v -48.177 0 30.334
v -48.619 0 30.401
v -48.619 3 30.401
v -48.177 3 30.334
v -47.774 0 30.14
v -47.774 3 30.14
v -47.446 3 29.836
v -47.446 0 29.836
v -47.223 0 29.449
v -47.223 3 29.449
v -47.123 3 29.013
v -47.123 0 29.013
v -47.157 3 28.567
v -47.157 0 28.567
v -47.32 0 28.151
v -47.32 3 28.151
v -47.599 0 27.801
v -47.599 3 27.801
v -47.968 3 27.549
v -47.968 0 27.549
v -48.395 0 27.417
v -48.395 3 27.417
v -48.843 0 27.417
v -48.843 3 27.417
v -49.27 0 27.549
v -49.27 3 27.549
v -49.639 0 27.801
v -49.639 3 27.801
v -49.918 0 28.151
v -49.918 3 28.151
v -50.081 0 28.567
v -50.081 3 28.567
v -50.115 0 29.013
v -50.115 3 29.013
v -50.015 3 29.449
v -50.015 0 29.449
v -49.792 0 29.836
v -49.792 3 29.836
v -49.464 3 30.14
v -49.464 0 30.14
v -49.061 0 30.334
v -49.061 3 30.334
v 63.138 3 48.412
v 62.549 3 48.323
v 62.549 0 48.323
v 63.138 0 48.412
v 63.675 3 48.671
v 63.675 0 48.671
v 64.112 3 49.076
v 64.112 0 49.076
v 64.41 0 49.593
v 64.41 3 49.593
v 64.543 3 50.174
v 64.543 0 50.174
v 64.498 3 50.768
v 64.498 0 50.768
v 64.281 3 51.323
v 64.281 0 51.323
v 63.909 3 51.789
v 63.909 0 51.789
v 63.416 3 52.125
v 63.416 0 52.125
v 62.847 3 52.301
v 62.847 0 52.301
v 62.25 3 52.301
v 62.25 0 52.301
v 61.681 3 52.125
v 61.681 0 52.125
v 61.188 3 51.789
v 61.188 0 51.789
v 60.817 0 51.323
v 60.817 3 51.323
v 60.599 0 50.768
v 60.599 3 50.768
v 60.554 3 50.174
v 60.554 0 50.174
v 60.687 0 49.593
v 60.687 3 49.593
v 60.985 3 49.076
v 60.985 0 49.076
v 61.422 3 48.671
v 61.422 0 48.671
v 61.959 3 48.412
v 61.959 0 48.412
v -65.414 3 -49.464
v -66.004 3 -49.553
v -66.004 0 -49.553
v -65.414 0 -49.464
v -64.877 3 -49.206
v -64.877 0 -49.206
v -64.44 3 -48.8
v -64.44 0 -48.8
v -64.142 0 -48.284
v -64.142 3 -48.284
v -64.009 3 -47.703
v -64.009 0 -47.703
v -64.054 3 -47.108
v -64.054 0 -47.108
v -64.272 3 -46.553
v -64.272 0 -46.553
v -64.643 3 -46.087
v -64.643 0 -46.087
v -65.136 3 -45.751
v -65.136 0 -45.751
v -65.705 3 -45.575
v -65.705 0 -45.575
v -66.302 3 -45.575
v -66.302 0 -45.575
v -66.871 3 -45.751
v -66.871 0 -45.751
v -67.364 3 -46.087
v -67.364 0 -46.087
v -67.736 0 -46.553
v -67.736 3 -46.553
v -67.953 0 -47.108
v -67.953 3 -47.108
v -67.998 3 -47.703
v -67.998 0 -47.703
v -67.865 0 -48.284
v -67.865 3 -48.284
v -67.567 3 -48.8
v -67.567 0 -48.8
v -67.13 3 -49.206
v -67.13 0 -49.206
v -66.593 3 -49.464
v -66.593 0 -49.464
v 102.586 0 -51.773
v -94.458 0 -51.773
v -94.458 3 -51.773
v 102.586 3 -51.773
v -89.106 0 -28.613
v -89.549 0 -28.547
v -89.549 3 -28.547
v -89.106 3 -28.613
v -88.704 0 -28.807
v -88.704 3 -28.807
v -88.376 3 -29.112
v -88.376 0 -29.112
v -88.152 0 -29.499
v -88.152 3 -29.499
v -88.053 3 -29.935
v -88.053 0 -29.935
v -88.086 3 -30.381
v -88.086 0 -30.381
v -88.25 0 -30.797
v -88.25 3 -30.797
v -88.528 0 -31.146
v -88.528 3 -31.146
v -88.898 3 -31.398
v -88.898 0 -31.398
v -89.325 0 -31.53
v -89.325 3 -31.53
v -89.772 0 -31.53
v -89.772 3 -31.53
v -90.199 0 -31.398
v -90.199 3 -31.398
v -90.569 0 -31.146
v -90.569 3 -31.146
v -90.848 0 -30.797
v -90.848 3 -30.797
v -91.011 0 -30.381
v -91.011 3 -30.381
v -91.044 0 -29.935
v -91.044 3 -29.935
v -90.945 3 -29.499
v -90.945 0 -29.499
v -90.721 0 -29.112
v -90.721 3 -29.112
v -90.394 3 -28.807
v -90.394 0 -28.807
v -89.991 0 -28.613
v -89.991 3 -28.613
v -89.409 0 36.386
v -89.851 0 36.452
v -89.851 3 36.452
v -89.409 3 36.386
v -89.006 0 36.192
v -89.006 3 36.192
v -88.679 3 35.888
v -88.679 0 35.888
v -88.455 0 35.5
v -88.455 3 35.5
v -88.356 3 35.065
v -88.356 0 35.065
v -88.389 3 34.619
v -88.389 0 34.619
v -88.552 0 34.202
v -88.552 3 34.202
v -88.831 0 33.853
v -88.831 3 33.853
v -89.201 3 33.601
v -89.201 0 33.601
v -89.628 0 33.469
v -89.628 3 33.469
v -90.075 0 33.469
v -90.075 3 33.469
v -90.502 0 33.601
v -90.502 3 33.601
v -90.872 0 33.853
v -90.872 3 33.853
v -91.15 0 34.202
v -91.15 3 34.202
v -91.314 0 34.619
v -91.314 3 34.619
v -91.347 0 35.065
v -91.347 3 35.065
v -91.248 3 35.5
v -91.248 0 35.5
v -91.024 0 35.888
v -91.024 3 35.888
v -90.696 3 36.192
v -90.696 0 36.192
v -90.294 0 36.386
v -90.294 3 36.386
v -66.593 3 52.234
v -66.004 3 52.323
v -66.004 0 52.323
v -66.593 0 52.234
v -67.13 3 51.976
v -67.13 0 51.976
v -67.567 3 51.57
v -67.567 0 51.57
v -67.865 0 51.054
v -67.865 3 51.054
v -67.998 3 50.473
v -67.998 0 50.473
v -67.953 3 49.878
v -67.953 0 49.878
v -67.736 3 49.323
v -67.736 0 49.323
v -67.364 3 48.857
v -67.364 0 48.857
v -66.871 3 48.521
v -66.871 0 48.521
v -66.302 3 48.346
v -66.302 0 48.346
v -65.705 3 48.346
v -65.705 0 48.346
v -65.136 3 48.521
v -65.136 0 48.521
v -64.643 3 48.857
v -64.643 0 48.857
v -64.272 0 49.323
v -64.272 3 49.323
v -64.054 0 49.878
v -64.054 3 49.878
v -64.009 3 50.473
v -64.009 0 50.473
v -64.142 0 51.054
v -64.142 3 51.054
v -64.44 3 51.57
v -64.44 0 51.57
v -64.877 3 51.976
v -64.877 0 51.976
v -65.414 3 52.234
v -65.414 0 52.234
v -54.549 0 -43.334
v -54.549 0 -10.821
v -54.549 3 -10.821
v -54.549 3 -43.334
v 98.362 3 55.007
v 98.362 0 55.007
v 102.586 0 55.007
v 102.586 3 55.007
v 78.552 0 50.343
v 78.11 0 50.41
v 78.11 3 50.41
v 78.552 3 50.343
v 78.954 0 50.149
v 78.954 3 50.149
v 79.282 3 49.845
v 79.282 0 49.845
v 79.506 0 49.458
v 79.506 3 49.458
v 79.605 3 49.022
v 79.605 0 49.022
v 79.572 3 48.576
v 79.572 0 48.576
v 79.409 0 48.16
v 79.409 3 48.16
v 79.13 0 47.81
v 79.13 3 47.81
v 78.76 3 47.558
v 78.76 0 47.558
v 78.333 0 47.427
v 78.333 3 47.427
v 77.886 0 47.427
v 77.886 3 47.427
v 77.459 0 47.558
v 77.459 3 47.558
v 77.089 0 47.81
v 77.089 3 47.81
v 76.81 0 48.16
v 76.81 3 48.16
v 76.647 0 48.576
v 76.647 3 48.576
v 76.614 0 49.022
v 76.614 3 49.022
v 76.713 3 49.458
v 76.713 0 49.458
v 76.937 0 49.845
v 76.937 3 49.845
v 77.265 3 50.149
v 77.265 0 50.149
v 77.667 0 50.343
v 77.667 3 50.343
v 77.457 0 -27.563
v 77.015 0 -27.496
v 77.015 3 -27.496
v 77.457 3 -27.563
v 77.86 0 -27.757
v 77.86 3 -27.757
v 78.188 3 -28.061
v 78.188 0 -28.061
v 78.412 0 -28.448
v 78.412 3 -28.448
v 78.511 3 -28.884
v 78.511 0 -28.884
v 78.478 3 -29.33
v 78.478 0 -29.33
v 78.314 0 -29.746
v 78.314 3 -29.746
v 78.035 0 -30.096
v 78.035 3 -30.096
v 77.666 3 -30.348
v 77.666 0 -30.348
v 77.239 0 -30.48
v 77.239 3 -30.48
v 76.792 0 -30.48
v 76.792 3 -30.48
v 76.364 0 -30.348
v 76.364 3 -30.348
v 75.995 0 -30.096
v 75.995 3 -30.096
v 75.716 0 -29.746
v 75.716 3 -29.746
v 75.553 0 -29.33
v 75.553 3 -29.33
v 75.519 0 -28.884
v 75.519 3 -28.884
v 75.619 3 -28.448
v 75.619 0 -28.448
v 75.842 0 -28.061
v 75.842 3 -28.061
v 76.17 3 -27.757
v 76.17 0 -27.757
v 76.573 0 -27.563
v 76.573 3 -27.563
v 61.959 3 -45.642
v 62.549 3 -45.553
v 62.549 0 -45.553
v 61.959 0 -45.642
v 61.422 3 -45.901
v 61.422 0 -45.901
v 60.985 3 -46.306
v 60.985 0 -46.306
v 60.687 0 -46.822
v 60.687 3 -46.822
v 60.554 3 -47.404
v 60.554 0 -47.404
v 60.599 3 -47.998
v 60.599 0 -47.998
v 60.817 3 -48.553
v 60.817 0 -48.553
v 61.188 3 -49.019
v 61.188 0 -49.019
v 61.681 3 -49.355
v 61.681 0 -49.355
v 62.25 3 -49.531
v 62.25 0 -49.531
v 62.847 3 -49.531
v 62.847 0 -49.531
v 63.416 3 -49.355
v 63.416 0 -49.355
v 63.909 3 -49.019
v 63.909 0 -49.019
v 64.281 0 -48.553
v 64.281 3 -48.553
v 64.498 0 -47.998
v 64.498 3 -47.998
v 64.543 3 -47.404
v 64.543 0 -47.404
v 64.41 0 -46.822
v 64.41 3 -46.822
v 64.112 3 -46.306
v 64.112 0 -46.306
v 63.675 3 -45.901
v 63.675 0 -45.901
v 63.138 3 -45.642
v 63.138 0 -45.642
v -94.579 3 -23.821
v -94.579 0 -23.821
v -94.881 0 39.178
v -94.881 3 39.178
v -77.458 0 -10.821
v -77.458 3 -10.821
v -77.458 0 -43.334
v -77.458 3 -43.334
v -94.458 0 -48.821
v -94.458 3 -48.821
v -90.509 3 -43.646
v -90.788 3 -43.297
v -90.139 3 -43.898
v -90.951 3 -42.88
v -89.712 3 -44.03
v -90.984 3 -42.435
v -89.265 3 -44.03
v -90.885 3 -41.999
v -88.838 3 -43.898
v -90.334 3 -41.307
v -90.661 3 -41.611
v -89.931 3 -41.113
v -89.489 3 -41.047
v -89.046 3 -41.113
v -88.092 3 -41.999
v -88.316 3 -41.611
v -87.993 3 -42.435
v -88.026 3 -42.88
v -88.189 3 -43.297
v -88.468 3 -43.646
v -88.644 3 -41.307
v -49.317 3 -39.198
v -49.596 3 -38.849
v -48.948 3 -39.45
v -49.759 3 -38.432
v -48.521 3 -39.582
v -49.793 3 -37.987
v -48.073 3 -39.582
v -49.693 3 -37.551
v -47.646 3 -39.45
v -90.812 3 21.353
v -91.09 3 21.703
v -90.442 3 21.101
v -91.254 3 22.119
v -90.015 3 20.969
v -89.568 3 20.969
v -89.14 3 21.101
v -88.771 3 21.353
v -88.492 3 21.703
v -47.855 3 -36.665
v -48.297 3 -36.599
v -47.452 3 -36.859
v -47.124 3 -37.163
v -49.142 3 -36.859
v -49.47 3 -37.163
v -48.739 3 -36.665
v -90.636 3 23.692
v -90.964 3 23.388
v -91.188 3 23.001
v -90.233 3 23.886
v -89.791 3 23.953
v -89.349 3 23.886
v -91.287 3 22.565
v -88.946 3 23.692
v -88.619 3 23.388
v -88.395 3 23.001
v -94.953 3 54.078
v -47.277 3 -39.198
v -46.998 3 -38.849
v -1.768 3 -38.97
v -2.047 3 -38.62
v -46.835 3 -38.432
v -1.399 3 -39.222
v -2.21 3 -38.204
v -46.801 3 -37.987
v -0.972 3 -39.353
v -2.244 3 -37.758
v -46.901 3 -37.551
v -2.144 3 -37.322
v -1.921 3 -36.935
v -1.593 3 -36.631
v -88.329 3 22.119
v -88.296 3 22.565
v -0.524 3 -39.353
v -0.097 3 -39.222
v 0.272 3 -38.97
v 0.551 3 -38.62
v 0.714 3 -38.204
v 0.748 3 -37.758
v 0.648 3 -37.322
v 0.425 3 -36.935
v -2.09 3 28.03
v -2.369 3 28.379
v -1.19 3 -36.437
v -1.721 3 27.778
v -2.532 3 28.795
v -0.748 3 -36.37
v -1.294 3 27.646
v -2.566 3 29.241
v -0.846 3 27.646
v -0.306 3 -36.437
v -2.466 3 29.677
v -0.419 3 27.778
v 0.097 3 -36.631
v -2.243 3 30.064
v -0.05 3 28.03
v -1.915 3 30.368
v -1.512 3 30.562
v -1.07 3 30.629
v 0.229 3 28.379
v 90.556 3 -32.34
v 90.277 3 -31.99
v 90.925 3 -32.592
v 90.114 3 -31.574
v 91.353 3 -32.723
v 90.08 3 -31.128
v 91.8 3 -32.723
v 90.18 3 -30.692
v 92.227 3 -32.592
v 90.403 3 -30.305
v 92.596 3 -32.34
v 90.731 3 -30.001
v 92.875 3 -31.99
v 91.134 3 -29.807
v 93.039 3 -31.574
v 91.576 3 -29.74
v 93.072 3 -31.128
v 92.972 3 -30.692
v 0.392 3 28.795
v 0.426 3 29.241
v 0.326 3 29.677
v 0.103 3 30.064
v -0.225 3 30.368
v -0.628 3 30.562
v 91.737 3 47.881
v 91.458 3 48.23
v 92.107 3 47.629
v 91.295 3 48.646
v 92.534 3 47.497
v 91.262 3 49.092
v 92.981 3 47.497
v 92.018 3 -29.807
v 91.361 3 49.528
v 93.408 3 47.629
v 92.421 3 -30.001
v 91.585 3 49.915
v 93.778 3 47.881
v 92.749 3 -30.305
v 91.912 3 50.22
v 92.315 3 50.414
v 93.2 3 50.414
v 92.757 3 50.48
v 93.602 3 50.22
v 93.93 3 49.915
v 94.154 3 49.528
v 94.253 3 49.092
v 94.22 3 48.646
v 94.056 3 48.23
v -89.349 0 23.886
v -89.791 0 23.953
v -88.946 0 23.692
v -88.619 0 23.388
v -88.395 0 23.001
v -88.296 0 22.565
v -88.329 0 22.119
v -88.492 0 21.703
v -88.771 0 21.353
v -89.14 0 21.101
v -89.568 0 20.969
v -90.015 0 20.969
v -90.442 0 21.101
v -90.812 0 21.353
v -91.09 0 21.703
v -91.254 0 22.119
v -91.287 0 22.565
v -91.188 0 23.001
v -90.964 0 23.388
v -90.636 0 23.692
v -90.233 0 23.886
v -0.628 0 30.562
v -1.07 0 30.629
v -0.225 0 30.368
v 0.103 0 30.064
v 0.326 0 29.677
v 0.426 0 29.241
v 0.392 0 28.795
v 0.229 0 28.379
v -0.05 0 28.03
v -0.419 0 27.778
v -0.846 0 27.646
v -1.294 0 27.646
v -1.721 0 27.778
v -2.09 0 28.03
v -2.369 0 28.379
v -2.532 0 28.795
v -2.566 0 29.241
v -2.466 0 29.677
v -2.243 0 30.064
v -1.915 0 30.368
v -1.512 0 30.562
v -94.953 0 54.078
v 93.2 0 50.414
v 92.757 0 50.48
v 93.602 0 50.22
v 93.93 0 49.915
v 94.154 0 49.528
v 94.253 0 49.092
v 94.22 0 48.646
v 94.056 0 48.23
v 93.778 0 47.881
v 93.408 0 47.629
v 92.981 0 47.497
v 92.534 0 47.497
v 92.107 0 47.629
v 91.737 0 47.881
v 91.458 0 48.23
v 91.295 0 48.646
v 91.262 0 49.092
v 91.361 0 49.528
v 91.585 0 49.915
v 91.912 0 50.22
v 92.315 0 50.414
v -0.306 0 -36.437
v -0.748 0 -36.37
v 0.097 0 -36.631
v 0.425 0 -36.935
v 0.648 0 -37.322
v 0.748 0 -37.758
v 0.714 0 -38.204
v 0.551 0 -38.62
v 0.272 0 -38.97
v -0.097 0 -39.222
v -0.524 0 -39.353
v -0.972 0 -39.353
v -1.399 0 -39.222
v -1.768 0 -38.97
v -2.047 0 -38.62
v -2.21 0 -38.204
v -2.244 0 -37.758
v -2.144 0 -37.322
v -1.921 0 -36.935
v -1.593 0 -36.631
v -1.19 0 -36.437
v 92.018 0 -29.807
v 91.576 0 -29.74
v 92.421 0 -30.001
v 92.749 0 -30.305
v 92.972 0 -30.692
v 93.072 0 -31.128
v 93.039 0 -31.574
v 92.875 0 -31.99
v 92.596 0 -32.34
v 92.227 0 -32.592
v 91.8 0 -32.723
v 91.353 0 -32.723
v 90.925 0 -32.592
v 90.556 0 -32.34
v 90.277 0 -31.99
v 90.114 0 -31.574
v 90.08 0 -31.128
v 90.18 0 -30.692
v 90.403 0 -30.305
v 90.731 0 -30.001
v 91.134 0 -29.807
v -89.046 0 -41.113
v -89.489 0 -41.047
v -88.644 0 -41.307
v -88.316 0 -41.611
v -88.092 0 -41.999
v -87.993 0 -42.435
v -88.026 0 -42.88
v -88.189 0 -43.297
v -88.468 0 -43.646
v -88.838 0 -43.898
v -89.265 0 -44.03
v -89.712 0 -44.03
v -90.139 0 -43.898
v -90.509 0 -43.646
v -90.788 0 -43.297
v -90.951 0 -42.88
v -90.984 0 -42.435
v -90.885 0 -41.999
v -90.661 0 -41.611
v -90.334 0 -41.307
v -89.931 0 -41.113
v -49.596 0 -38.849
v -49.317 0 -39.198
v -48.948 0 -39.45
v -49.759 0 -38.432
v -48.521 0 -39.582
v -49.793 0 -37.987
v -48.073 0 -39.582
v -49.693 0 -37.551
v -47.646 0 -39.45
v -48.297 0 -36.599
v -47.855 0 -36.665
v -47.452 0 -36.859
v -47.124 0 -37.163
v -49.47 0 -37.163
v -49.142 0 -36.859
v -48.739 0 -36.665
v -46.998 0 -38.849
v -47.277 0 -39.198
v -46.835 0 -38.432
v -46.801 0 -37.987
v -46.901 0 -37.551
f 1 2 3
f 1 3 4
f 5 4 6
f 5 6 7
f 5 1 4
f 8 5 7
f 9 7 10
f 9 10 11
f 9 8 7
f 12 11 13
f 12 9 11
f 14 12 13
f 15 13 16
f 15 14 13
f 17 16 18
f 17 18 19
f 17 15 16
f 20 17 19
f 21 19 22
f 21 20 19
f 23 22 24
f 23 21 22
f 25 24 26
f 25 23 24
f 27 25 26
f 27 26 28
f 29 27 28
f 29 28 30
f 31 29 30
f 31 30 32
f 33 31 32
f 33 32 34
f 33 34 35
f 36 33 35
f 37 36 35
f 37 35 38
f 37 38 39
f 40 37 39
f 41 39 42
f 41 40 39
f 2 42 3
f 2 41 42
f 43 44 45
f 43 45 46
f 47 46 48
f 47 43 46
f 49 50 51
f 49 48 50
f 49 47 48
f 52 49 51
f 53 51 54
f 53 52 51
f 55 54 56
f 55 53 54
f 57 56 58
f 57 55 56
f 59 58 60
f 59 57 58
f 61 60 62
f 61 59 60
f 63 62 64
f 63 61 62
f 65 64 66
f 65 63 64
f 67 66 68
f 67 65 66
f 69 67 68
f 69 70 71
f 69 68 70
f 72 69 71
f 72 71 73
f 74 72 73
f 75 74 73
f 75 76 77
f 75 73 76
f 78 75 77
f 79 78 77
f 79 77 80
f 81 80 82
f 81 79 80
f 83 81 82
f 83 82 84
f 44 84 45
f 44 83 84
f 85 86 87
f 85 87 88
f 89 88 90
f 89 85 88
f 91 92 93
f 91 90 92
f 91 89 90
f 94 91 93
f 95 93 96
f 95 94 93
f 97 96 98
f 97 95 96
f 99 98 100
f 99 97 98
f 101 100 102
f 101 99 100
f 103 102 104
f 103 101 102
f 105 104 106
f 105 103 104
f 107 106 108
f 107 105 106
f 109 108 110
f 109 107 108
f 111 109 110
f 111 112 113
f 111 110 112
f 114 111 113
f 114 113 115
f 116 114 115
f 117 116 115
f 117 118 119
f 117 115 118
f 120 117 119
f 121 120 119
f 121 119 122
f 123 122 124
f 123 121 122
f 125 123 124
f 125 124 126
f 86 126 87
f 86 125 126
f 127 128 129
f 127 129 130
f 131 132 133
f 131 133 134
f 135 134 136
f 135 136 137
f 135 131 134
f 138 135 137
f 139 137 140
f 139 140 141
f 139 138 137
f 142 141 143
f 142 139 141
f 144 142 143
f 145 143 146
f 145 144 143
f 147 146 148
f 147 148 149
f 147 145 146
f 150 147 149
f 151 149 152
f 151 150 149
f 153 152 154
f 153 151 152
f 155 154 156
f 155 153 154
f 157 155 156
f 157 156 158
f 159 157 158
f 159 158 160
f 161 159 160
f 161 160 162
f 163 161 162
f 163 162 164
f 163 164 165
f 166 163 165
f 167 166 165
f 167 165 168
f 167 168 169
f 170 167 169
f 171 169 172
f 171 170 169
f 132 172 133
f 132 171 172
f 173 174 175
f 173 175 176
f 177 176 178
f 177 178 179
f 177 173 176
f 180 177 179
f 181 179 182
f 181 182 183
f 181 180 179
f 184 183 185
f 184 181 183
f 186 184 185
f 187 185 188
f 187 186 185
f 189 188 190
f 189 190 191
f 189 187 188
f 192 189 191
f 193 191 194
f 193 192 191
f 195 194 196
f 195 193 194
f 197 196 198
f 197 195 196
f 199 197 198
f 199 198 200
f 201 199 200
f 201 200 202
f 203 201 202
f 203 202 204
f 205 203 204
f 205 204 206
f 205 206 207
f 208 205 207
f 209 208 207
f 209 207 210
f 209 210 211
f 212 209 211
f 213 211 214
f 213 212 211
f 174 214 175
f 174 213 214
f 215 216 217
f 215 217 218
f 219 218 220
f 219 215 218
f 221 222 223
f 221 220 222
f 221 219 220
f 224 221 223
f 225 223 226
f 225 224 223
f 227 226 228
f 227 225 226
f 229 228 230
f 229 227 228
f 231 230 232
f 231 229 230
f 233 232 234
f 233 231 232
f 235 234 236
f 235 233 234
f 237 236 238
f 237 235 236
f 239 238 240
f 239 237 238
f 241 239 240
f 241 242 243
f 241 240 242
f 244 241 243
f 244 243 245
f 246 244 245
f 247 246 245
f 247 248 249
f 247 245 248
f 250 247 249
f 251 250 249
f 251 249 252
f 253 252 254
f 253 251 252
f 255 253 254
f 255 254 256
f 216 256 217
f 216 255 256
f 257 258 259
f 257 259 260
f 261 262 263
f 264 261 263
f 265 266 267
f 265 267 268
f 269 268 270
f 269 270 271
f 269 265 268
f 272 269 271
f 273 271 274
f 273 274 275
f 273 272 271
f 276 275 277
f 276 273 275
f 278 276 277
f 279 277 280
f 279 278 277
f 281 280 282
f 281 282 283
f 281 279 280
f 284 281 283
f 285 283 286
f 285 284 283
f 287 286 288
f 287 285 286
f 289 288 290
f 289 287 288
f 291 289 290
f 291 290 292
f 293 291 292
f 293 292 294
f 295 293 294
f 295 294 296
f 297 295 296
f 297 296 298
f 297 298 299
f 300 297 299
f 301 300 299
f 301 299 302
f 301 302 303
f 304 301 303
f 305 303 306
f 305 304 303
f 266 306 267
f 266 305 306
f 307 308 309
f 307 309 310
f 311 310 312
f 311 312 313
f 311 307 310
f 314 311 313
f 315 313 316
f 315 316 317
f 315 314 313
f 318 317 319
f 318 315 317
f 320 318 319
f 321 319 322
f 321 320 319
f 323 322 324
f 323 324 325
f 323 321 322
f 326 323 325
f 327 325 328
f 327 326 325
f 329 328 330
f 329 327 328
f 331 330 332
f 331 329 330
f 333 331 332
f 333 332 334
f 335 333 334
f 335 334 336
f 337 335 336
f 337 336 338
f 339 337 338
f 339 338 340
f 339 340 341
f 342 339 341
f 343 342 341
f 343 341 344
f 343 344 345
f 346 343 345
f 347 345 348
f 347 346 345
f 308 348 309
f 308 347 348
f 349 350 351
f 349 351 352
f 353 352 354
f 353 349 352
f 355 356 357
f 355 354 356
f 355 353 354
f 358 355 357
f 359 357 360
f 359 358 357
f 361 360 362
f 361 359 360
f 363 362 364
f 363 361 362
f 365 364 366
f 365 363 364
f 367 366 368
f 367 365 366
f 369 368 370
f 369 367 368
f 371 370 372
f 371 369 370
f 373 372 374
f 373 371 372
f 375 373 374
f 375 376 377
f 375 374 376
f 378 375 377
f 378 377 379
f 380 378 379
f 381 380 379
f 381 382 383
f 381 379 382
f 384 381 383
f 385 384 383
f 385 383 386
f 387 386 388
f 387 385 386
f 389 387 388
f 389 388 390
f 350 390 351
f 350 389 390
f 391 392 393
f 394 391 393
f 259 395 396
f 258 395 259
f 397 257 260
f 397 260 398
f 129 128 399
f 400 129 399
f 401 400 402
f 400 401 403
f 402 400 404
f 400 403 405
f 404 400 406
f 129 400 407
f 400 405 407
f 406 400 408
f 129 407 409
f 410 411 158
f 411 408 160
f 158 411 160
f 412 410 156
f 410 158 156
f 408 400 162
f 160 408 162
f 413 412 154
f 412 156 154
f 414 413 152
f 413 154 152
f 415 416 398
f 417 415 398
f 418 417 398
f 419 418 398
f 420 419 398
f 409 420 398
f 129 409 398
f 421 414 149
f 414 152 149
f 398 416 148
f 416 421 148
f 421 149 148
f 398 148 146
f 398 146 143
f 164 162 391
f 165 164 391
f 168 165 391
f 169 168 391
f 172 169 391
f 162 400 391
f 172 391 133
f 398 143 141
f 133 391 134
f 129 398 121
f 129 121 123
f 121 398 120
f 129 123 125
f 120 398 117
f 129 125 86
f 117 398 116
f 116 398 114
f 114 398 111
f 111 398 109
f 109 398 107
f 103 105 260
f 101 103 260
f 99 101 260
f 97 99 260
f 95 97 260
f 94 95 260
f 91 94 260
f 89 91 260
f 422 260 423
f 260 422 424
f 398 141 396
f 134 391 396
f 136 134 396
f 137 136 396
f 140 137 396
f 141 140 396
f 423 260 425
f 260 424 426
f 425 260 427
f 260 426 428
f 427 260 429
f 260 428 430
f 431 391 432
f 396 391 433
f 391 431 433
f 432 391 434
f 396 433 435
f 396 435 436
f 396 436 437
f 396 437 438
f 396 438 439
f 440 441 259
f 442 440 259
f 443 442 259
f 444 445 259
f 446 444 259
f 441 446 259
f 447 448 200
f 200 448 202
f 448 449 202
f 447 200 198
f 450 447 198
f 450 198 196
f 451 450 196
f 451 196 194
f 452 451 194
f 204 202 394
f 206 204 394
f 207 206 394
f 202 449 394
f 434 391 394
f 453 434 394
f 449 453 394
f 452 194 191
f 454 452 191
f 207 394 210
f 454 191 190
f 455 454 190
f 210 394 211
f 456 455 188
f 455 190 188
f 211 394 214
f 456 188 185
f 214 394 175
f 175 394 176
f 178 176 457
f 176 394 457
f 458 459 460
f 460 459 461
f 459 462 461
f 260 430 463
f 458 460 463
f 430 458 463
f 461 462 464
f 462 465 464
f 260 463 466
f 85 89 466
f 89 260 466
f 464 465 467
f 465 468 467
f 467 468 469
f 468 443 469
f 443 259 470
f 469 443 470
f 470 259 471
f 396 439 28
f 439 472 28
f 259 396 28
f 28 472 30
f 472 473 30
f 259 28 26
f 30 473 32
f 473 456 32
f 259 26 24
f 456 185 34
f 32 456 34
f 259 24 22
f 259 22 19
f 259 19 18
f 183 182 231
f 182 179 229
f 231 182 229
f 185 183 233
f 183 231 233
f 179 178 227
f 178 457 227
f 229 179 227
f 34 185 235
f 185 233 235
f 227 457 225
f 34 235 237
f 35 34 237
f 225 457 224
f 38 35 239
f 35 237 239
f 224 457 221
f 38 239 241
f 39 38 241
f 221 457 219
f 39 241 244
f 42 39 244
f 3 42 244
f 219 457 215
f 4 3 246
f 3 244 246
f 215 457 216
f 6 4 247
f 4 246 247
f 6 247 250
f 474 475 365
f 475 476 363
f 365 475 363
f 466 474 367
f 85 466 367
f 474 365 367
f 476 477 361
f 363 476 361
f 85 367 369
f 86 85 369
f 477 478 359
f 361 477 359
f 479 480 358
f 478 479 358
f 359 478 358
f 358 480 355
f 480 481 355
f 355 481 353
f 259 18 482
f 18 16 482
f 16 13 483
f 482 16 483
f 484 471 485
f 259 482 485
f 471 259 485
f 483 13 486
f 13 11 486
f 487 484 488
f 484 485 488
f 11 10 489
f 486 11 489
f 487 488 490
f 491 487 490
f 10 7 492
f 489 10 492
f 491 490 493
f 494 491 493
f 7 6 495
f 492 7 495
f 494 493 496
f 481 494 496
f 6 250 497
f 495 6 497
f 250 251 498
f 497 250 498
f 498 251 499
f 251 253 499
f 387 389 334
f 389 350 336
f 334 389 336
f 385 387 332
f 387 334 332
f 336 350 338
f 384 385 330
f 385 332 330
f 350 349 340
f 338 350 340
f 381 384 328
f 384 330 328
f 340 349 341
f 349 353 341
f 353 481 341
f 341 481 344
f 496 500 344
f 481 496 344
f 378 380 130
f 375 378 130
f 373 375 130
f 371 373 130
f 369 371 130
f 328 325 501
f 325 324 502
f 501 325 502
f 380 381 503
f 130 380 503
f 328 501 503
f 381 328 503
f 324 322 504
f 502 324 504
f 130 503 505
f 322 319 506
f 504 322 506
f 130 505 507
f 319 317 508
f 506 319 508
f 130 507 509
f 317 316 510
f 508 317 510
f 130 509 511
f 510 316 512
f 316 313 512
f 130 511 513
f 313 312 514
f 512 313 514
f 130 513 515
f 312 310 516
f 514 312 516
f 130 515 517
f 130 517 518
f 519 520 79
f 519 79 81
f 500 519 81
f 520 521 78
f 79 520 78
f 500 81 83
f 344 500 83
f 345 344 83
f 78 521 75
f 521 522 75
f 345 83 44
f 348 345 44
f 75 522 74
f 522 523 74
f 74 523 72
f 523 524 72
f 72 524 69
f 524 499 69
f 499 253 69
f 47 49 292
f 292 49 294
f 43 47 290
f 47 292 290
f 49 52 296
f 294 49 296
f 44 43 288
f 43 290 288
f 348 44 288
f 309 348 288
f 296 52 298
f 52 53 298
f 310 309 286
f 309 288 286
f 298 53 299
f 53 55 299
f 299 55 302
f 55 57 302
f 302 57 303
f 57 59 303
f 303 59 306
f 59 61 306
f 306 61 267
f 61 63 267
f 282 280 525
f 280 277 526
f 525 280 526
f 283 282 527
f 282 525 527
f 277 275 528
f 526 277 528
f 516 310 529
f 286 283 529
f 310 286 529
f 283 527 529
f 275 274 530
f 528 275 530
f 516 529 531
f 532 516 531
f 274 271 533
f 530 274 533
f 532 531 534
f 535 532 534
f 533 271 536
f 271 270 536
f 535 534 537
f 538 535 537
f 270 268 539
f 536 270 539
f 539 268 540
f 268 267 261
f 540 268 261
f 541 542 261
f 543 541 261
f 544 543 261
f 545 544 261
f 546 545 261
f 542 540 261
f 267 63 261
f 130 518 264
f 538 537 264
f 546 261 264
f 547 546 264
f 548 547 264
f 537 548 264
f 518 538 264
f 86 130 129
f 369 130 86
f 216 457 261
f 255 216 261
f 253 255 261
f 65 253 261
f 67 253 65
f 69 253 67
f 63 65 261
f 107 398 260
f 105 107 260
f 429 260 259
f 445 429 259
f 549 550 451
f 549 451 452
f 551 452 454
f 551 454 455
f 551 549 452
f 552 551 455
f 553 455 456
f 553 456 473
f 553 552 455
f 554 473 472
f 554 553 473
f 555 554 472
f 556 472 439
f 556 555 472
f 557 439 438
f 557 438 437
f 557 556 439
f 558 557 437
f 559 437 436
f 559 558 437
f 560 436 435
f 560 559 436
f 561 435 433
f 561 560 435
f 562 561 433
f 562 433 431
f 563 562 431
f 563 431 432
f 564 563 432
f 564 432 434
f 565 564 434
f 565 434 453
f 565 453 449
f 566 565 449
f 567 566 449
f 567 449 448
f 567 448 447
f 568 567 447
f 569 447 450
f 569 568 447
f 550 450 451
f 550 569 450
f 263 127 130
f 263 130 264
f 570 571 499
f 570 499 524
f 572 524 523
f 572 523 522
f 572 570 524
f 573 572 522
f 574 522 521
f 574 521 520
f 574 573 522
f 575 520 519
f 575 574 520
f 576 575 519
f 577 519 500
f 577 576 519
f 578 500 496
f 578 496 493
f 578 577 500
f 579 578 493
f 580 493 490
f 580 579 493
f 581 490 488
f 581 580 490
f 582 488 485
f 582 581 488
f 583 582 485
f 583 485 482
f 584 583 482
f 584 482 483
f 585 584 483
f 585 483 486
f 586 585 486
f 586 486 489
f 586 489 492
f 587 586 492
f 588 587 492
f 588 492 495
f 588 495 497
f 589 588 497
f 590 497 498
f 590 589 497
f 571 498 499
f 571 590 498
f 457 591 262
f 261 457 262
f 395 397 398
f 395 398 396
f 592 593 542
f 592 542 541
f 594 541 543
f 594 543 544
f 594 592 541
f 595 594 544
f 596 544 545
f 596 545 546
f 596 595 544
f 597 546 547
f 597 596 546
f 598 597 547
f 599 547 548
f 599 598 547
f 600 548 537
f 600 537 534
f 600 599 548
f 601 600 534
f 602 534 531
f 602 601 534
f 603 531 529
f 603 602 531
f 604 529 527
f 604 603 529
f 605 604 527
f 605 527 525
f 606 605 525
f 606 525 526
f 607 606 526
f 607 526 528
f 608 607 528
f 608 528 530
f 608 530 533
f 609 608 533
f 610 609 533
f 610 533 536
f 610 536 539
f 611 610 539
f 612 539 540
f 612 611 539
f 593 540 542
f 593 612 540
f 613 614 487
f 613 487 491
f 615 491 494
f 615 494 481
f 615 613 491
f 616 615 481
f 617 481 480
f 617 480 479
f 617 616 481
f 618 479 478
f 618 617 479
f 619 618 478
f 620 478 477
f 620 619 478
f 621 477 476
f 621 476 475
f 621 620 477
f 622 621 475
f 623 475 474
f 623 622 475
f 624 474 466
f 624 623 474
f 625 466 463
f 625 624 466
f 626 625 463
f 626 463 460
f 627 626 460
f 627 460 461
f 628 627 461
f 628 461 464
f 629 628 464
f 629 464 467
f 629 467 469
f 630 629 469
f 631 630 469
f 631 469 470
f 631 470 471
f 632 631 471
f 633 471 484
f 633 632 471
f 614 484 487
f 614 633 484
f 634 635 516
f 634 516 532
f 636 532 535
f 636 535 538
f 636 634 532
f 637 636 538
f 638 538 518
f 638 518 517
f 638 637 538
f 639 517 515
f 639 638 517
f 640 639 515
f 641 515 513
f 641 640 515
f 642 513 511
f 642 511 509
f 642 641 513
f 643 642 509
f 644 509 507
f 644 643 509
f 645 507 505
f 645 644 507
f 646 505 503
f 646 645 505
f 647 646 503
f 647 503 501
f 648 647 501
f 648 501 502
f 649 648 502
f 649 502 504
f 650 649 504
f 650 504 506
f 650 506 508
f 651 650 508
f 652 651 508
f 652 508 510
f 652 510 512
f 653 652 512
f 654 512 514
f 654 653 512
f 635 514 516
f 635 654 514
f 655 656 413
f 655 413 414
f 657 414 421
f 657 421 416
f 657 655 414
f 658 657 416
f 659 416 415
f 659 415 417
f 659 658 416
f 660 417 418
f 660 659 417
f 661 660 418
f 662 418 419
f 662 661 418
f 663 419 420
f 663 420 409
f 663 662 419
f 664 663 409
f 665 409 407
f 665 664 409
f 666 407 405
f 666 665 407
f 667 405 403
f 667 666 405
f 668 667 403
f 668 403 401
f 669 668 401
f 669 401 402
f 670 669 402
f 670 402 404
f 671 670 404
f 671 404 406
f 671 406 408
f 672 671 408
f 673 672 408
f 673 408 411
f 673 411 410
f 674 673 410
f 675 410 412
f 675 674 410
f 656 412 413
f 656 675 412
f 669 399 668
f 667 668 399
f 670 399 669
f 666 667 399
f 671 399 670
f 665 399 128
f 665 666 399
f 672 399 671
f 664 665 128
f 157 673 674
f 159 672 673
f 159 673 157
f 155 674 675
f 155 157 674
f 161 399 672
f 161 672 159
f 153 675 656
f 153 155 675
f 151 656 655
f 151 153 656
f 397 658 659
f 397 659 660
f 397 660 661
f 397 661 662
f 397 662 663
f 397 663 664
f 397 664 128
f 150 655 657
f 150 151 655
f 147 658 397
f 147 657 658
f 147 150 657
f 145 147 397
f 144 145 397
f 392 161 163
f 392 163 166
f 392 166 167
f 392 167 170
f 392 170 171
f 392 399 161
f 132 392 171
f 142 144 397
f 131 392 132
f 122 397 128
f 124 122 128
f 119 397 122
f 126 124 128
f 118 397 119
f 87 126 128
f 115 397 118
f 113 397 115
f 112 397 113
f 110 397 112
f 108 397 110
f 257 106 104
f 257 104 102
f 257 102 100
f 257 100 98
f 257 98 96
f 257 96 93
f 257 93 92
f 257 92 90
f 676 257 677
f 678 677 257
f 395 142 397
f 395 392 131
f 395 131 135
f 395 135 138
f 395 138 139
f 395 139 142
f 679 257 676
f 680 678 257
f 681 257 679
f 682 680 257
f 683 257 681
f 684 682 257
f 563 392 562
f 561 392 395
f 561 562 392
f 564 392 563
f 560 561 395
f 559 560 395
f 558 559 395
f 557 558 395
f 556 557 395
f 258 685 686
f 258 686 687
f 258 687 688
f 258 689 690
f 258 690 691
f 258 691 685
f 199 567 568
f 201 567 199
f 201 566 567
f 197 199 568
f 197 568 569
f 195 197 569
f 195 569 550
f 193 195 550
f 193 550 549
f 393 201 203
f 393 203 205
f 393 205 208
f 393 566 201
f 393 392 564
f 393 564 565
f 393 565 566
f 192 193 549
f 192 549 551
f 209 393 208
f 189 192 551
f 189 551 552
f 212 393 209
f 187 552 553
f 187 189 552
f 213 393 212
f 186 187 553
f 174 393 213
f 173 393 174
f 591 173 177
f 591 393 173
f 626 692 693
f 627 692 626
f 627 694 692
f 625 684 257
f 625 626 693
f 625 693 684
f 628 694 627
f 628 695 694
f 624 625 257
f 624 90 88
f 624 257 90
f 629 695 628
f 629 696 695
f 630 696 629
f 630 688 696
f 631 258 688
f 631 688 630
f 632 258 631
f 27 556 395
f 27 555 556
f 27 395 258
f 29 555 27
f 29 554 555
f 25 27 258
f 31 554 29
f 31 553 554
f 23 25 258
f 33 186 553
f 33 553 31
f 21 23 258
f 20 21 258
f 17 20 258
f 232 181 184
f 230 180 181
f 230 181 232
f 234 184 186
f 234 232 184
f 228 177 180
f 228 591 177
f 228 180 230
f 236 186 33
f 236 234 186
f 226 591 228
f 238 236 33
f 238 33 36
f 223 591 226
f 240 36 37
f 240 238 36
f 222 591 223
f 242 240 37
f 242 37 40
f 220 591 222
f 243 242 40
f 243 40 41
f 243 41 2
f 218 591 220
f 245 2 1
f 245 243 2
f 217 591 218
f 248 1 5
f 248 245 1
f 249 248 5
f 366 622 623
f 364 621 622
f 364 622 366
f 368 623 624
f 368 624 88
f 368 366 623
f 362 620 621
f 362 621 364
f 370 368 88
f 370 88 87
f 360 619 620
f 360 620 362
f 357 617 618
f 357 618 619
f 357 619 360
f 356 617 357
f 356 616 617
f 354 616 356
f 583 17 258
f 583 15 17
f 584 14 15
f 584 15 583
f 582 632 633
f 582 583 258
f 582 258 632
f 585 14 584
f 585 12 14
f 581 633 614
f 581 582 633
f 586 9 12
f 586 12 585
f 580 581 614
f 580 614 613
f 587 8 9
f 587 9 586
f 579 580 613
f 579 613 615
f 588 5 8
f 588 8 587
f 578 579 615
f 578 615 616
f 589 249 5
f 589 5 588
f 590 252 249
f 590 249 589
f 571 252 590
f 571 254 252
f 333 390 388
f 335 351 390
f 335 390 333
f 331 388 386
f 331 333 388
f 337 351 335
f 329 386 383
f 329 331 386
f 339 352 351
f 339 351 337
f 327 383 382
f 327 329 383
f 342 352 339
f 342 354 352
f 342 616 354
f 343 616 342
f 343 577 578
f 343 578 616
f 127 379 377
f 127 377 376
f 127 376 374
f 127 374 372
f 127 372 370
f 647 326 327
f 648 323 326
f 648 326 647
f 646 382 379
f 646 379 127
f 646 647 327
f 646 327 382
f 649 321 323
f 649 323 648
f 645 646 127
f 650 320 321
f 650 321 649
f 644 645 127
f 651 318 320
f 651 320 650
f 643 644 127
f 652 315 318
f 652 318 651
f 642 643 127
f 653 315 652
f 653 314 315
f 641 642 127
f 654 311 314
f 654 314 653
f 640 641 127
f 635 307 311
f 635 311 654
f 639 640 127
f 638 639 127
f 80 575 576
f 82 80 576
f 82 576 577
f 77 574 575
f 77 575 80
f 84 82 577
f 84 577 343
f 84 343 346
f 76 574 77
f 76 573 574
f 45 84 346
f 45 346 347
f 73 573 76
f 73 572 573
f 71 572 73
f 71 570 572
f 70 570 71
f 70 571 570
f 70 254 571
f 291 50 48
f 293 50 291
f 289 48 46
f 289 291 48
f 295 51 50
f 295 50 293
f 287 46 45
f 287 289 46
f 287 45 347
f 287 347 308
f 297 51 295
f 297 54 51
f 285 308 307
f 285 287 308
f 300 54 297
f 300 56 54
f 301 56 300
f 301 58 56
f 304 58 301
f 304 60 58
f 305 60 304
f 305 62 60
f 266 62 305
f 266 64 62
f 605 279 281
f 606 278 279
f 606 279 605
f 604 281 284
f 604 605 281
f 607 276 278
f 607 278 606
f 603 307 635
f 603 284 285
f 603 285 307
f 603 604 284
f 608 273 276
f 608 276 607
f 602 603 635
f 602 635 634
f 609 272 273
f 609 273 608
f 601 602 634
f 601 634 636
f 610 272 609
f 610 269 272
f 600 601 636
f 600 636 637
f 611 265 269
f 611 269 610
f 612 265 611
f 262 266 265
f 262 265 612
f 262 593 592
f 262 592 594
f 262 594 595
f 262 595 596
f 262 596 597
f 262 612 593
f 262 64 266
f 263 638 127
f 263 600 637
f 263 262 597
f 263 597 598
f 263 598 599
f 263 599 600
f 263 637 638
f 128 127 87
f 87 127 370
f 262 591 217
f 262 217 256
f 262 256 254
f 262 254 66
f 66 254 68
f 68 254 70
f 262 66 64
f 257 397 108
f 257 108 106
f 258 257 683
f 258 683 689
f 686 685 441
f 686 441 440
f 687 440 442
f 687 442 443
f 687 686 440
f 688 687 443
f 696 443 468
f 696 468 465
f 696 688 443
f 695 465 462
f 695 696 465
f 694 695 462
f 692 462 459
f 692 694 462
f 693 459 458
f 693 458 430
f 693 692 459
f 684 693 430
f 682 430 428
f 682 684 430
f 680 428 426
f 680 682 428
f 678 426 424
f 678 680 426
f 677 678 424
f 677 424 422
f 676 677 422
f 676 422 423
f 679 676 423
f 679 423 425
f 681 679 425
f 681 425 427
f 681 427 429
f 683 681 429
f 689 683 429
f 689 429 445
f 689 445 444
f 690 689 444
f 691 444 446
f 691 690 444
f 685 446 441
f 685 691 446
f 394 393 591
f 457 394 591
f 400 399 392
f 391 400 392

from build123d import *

# Parameters (mm, degrees)
SKETCH1_R               = 1.5
BOSS_EXTRUDE1_DEPTH     = 3
CUT_EXTRUDE1_DEPTH      = 117.441839515
CUT_EXTRUDE1_DEPTH_BACK = 117.441839515
BOSS_EXTRUDE4_DEPTH     = 3
SKETCH5_W               = 197.044523164
SKETCH5_H               = 3
BOSS_EXTRUDE5_DEPTH     = 3
CUT_EXTRUDE3_DEPTH      = 117.441839515
CUT_EXTRUDE3_DEPTH_BACK = 117.441839515
SKETCH6_R               = 2


with BuildPart() as part:
    # Sketch1 → Boss-Extrude1 (new body)
    with BuildSketch(Plane(origin=(0, 0, 0), x_dir=(1, 0, 0), z_dir=(0, 1, 0))):
        Polygon((-84.458557919, 26.833968268), (-84.458557919, 48.772574994), (-94.458442431, 48.8206348), (-94.578591945, 23.820923519), (-94.881368721, -39.178348907), (-94.952977831, -54.07817683), (98.36173931, -55.007254334), (102.586080733, -55.007254334), (102.586080733, 22.87334299), (102.586080733, 48.772574994), (-62.665629197, 48.772574994), (-62.665629197, 26.833968268), align=None)
        with Locations(Location((-89.851389086, -34.95245099, 0), (0, 0, 270))):
            Circle(SKETCH1_R, mode=Mode.SUBTRACT)
        with Locations(Location((-1.069960941, -29.129088653, 0), (0, 0, 270))):
            Circle(SKETCH1_R, mode=Mode.SUBTRACT)
        with Locations(Location((-89.791314329, -22.452595349, 0), (0, 0, 270))):
            Circle(SKETCH1_R, mode=Mode.SUBTRACT)
        with Locations(Location((-48.61901855, -28.900566167, 0), (0, 0, 270))):
            Circle(SKETCH1_R, mode=Mode.SUBTRACT)
        with Locations(Location((78.109513121, -48.909852111, 0), (0, 0, 270))):
            Circle(SKETCH1_R, mode=Mode.SUBTRACT)
        with Locations(Location((92.757382127, -48.980250297, 0), (0, 0, 270))):
            Circle(SKETCH1_R, mode=Mode.SUBTRACT)
        with Locations(Location((-89.548612311, 30.046821437, 0), (0, 0, 270))):
            Circle(SKETCH1_R, mode=Mode.SUBTRACT)
        with Locations(Location((-89.488537553, 42.546677077, 0), (0, 0, 270))):
            Circle(SKETCH1_R, mode=Mode.SUBTRACT)
        with Locations(Location((-48.297017852, 38.098660064, 0), (0, 0, 270))):
            Circle(SKETCH1_R, mode=Mode.SUBTRACT)
        with Locations(Location((-0.747960243, 37.870137578, 0), (0, 0, 270))):
            Circle(SKETCH1_R, mode=Mode.SUBTRACT)
        with Locations(Location((77.015212266, 28.9963068, 0), (0, 0, 270))):
            Circle(SKETCH1_R, mode=Mode.SUBTRACT)
        with Locations(Location((91.576164691, 31.240232702, 0), (0, 0, 270))):
            Circle(SKETCH1_R, mode=Mode.SUBTRACT)
    extrude(amount=BOSS_EXTRUDE1_DEPTH)

    # Sketch3 → Cut-Extrude1 (cut, two sides: drawn at the far end of the back side and taken through both)
    with BuildSketch(Plane(origin=(0, 3, 0), x_dir=(1, 0, 0), z_dir=(0, 1, 0)).offset(-CUT_EXTRUDE1_DEPTH_BACK)):
        Polygon((-62.665629197, 26.833968268), (-77.458442431, 26.833968268), (-77.458442431, 10.8206348), (-54.548666479, 10.8206348), (-54.548666479, 48.772574994), (-62.665629197, 48.772574994), align=None)
    extrude(amount=CUT_EXTRUDE1_DEPTH + CUT_EXTRUDE1_DEPTH_BACK, mode=Mode.SUBTRACT)

    # Sketch4 → Boss-Extrude4 (add)
    with BuildSketch(Plane.XZ):
        Polygon((-77.458442431, -26.833968268), (-84.458557919, -26.833968268), (-84.458557919, -48.772574994), (-54.548666479, -48.772574994), (-54.548666479, -43.333568131), (-77.458442431, -43.333568131), align=None)
    extrude(amount=-BOSS_EXTRUDE4_DEPTH)

    # Sketch5 → Boss-Extrude5 (add)
    with BuildSketch(Plane.XZ):
        with Locations((4.063819151, -50.272574994)):
            Rectangle(SKETCH5_W, SKETCH5_H)
    extrude(amount=-BOSS_EXTRUDE5_DEPTH)

    # Sketch6 → Cut-Extrude3 (cut, two sides: drawn at the far end of the back side and taken through both)
    with BuildSketch(Plane.XZ.offset(-CUT_EXTRUDE3_DEPTH_BACK)):
        with Locations(Location((-66.003554455, -47.553071563, 0), (0, 0, 270))):
            Circle(SKETCH6_R)
        with Locations(Location((62.548576351, -47.553071563, 0), (0, 0, 90))):
            Circle(SKETCH6_R)
        with Locations(Location((62.548576351, 50.323212151, 0), (0, 0, 270))):
            Circle(SKETCH6_R)
        with Locations(Location((-66.003554455, 50.323212151, 0), (0, 0, 90))):
            Circle(SKETCH6_R)
    extrude(amount=CUT_EXTRUDE3_DEPTH + CUT_EXTRUDE3_DEPTH_BACK, mode=Mode.SUBTRACT)


solid = part.part
